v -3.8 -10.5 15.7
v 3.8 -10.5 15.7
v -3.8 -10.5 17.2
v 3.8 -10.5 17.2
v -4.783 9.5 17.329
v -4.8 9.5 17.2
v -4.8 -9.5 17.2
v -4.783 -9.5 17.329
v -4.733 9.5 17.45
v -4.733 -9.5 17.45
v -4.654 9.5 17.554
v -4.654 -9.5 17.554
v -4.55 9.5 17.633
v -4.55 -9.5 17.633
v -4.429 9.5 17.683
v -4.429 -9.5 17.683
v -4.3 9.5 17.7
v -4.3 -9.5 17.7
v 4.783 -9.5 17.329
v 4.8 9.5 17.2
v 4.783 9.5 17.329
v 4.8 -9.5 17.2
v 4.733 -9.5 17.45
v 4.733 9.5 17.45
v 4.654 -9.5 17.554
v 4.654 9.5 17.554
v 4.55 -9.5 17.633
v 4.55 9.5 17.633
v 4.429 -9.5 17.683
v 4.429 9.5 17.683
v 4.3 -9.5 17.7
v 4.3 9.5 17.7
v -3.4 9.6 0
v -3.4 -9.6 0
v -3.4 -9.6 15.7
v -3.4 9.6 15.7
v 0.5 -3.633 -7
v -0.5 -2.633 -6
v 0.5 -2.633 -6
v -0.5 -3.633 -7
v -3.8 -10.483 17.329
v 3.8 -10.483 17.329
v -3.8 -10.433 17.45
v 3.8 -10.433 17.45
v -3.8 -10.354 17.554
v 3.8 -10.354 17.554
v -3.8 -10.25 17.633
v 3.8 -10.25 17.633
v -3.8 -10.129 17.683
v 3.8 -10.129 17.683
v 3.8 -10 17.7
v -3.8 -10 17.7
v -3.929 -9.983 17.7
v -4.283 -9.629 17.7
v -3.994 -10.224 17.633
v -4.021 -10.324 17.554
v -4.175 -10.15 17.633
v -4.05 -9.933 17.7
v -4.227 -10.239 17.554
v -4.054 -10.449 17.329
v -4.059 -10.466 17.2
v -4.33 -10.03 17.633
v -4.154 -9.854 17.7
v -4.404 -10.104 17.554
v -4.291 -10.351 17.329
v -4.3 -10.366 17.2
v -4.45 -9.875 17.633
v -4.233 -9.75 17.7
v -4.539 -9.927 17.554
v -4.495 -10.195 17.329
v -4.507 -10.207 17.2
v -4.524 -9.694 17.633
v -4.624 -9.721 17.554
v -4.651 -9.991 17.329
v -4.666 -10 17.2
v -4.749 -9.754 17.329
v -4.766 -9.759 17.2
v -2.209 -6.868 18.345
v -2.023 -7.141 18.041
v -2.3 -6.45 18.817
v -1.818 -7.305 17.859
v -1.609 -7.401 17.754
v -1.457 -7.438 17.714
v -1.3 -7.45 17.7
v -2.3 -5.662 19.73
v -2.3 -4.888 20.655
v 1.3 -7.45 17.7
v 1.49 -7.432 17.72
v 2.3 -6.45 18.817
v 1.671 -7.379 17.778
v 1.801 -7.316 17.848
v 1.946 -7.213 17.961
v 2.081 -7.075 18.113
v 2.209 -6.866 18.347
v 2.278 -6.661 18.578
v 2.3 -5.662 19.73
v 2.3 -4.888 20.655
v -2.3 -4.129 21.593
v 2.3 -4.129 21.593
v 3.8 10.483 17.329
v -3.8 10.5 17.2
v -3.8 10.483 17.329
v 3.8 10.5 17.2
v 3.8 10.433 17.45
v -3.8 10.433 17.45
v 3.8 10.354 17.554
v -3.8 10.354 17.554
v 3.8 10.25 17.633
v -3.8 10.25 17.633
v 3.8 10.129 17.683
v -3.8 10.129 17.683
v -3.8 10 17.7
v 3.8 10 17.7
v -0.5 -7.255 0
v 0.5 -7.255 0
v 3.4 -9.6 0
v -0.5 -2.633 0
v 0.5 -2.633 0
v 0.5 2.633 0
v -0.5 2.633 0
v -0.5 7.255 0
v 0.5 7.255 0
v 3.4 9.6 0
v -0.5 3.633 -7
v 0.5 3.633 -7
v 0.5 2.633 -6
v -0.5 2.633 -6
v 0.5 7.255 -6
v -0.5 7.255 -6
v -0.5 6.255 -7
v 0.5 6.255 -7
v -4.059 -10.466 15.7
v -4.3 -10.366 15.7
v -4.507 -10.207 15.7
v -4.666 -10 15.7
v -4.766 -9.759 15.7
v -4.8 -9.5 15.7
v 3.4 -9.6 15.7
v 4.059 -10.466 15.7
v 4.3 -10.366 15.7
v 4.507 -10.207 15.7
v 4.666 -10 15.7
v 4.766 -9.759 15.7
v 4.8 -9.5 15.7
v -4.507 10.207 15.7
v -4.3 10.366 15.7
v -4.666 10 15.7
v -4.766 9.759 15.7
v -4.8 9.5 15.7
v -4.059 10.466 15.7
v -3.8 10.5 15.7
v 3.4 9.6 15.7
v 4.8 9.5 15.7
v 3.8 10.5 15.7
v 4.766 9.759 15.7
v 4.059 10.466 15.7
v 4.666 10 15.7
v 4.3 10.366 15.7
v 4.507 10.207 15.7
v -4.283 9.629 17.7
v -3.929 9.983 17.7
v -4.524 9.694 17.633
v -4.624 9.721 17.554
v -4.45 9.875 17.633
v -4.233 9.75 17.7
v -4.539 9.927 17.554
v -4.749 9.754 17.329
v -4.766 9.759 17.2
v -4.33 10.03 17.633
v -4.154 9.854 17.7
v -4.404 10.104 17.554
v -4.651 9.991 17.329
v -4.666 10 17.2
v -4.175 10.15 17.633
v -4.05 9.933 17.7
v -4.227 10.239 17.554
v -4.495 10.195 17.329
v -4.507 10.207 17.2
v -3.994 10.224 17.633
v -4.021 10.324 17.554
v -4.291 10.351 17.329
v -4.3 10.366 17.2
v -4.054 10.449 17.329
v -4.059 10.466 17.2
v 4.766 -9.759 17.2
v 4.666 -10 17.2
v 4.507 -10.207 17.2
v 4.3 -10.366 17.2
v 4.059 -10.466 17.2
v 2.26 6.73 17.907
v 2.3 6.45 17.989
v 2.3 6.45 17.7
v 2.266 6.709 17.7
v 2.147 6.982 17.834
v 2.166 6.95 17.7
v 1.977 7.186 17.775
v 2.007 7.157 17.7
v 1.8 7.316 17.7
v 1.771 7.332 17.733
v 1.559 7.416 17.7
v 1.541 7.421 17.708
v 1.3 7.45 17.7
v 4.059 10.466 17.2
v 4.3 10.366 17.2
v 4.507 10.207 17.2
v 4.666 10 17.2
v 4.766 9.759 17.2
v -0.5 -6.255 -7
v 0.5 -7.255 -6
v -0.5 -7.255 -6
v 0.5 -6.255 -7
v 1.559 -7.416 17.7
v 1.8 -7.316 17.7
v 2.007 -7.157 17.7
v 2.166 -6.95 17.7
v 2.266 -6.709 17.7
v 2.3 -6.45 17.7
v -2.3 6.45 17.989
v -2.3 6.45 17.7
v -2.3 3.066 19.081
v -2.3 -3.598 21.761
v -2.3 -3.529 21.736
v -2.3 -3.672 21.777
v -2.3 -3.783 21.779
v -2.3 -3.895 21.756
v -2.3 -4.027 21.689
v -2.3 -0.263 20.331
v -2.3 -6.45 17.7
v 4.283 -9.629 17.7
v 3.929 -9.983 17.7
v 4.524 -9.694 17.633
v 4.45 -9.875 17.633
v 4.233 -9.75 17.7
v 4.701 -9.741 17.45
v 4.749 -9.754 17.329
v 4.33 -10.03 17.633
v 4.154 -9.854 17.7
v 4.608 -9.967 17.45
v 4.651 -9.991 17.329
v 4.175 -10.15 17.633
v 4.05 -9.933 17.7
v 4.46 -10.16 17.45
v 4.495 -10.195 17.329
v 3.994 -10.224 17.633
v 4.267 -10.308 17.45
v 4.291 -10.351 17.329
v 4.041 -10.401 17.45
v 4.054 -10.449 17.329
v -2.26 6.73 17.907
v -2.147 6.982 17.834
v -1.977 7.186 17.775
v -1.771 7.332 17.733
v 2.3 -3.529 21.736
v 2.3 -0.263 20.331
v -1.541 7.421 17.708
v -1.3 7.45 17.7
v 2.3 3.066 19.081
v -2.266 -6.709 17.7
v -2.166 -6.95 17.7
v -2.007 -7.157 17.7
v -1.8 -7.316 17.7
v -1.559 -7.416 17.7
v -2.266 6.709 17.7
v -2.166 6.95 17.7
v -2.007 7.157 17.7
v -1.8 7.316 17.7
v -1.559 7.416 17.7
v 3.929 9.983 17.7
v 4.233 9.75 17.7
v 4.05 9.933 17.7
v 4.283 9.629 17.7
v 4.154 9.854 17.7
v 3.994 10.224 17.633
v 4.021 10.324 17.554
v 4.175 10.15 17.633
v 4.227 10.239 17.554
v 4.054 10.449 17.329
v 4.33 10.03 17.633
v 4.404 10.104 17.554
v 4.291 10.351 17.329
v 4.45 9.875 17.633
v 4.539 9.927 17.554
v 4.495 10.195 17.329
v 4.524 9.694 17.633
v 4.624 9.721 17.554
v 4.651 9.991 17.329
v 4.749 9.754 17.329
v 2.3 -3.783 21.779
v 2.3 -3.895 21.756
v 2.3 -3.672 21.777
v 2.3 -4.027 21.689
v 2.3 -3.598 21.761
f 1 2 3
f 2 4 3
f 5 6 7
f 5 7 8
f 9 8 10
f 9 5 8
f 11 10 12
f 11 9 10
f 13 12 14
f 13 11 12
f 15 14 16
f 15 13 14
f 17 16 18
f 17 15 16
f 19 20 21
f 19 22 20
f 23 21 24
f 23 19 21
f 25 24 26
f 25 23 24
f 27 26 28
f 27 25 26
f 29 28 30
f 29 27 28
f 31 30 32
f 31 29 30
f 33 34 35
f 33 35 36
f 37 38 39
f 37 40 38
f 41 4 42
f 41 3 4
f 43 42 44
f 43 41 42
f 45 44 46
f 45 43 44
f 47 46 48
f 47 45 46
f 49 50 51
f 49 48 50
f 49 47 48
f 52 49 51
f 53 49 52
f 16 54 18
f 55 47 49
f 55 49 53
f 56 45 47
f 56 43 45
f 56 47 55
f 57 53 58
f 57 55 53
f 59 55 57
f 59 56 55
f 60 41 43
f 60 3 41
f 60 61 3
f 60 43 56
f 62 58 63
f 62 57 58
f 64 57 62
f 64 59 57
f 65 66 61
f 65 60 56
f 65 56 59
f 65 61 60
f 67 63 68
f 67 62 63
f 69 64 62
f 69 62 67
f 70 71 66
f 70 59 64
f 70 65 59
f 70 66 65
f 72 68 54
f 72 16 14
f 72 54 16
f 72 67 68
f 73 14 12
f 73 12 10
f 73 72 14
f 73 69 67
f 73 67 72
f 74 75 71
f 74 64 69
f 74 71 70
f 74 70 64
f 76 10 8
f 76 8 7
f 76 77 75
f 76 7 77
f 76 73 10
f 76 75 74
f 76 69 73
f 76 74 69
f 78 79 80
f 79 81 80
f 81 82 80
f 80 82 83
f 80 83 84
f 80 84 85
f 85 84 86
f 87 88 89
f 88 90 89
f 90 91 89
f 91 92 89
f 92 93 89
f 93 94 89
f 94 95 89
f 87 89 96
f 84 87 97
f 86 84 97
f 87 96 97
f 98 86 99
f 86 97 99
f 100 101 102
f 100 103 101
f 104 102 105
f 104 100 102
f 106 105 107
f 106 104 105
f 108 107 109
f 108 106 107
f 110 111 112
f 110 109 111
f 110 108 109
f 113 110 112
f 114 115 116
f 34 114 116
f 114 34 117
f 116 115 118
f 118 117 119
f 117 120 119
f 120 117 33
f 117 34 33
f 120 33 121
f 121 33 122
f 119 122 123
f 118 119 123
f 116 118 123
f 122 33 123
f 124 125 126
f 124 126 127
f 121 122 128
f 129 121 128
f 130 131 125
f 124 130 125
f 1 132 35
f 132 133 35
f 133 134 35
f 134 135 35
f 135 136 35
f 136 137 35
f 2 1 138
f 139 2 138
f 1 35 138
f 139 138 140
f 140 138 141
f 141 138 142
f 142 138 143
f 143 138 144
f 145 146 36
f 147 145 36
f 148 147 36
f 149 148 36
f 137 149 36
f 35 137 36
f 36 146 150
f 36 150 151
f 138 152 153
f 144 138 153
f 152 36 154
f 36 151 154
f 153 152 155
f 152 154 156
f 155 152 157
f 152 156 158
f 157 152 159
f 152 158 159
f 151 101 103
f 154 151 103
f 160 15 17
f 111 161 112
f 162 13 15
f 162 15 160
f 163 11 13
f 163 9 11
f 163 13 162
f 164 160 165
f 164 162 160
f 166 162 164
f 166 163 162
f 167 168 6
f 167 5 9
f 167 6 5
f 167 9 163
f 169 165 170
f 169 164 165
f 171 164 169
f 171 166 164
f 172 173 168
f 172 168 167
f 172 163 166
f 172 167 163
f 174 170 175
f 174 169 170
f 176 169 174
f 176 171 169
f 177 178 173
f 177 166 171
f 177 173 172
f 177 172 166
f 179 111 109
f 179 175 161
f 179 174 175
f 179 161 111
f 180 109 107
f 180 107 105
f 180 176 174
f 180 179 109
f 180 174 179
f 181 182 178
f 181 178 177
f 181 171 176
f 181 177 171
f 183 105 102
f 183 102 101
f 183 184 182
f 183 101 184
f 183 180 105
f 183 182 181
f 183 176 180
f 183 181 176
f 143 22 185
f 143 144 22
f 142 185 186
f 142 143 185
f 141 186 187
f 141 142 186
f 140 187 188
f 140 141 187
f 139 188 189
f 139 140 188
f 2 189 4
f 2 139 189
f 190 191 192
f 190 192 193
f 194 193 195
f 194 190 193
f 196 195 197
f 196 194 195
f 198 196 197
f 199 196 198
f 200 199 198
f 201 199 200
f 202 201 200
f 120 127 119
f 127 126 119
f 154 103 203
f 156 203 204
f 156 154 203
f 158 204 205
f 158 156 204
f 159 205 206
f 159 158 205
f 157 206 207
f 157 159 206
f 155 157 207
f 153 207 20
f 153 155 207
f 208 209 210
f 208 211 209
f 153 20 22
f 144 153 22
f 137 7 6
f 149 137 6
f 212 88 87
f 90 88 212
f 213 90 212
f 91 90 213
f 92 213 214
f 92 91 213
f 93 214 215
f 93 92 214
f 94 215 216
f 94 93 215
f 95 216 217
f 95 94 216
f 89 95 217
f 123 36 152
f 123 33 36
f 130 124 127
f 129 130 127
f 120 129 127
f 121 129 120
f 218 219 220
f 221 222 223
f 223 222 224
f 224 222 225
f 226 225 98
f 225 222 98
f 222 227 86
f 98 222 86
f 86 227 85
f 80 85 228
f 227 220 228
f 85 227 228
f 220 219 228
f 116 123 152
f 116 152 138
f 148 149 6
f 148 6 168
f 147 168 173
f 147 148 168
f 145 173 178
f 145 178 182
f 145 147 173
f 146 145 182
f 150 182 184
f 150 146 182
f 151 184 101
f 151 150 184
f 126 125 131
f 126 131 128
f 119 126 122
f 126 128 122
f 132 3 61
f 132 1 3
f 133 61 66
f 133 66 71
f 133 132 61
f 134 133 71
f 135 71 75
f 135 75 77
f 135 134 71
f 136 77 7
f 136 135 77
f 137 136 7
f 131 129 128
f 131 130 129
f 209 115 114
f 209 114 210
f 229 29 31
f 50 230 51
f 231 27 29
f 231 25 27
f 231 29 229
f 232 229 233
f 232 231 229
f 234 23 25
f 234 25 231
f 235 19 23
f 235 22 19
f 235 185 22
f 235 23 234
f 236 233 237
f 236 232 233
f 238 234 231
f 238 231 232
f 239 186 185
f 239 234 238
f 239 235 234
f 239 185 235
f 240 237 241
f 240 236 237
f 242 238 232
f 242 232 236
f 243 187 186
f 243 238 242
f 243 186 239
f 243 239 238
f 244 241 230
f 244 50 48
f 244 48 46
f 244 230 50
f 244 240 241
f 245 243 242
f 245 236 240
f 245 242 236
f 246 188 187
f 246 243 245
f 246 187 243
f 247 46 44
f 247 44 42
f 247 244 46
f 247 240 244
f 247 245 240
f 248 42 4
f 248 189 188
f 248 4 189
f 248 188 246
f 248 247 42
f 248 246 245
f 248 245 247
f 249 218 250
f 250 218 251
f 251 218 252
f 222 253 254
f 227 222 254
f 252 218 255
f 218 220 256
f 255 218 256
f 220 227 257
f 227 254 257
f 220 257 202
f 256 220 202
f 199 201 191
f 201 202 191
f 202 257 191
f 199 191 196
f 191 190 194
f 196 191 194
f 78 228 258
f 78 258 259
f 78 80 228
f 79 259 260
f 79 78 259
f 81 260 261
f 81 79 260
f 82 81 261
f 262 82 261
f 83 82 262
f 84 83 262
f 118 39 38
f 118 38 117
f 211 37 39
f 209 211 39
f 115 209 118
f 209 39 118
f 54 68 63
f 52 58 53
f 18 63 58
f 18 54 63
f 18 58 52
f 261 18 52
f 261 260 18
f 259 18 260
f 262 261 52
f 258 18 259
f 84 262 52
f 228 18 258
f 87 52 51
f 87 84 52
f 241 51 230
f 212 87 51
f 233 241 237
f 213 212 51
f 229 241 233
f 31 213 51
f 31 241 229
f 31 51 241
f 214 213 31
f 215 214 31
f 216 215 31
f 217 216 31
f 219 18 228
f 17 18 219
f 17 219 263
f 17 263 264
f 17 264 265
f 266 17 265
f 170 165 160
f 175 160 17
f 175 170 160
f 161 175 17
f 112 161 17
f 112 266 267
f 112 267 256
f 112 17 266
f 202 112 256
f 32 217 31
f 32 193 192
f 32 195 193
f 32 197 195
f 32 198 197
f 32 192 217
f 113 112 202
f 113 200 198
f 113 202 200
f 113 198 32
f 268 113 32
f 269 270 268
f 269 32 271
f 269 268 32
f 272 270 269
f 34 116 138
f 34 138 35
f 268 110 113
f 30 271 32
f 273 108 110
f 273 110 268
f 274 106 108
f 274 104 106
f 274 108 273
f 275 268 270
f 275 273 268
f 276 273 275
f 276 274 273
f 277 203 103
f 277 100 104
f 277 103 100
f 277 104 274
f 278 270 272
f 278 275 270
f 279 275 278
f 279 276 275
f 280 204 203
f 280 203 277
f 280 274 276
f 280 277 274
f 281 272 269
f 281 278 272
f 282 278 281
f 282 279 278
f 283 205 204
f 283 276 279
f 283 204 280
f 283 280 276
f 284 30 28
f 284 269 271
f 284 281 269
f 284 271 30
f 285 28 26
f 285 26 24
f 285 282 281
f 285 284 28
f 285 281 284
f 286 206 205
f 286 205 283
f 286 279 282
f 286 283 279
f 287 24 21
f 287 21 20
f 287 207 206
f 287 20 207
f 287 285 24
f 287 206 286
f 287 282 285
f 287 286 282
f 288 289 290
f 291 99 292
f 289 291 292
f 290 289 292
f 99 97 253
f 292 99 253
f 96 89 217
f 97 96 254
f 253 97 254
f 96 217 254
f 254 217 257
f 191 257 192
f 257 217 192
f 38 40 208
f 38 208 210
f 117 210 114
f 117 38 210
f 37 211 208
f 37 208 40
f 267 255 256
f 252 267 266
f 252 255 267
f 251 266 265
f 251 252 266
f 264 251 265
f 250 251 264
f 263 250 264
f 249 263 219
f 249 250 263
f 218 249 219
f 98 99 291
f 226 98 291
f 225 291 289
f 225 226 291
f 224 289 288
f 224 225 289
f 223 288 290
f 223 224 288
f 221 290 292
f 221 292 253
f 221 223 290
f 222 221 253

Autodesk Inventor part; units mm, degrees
ref_plane "YZ Plane" through (0, 0, 0) normal (1, 0, 0) x (0, 1, 0)
ref_plane "XZ Plane" through (0, 0, 0) normal (0, 1, 0) x (-1, 0, 0)
sketch "Base" plane through (0, 0, 0) normal (0, 0, 1) x (1, 0, 0)
  line L0 (-3.4, 9.6) -> (3.4, 9.6)
  line L1 (3.4, 9.6) -> (3.4, -9.6)
  line L2 (3.4, -9.6) -> (-3.4, -9.6)
  line L3 (-3.4, -9.6) -> (-3.4, 9.6)
  line L4 (-4.76, 0) -> (4.76, 0) construction
  line L5 (0, -13.44) -> (0, 13.44) construction
  point P0 (0, 0)
  point P1 (0, 9.6)
  point P2 (-3.4, 0)
  dimension "d0" = 6.8
  dimension "d1" = 19.2
extrude "BaseFeature" add sketch "Base" along normal blind 17.7
sketch "Mount" plane through (0, 0, 17.7) normal (0, 0, 1) x (1, 0, 0)
  line L0 (-4.8, 10.5) -> (4.8, 10.5)
  line L1 (4.8, 10.5) -> (4.8, -10.5)
  line L2 (4.8, -10.5) -> (-4.8, -10.5)
  line L3 (-4.8, -10.5) -> (-4.8, 10.5)
  line L4 (3.4, -9.6) -> (3.4, 9.6) construction
  line L5 (3.4, 0) -> (4.8, 0) construction
  line L6 (-3.4, -9.6) -> (3.4, -9.6) construction
  line L7 (0, -9.6) -> (0, -10.5) construction
  dimension "d13" = 9.6
  dimension "d14" = 21
extrude "MountFeature" add sketch "Mount" against normal blind 2
sketch "Sketch3" plane through (0, 0, 17.7) normal (0, 0, 1) x (1, 0, 0)
  line L0 (-2.3, -7.45) -> (2.3, -7.45)
  line L1 (-2.3, 7.45) -> (-2.3, -7.45)
  line L2 (2.3, 7.45) -> (-2.3, 7.45)
  line L3 (2.3, -7.45) -> (2.3, 7.45)
  line L4 (-4.8, 10.5) -> (-4.8, -10.5) projected
  line L5 (0, 0) -> (0, 10.5) construction
  line L6 (-4.8, 10.5) -> (4.8, 10.5) projected
  line L7 (-6.72, 0) -> (6.72, 0) construction
  point P0 (0, 7.45)
  point P1 (-2.3, 0)
  dimension "d22" = 14.9
  dimension "d23" = 4.6
extrude "Extrusion3" add sketch "Sketch3" along normal blind 4.2
fillet "Fillet4" radius 1 4 edges at (-2.3, 7.45, 19.8) (2.3, 7.45, 19.8) (-2.3, -7.45, 19.8) (2.3, -7.45, 19.8)
sketch "Sketch4" plane through (2.3, -7.45, 17.7) normal (1, 0, 0) x (0, 0, -1)
  line L0 (0, 0) -> (-4.2, 0) projected
  line L1 (-4.2, 14.9) -> (-4.2, 0) projected
  arc A0 (0, 0) -> (-4.2, 3.5647) centre (-50.9891, -55.8203) ccw
  line L2 (0, 0) -> (0, 14.9) projected
  arc A1 (-4.2, 3.5647) -> (0, 14.9) centre (-72.7661, 35.4157) ccw
  line L3 (0, 14.9) -> (-4.2, 14.9) projected
  point P0 (17.7, 7.45)
extrude "Extrusion4" cut sketch "Sketch4" against normal through all contours L0 L1 A0 | L1 L3 A1
fillet "Fillet1" radius 0.5 1 edges at (0, -3.8853, 21.9)
fillet "Fillet2" radius 1 4 edges at (4.8, -10.5, 16.7) (4.8, 10.5, 16.7) (-4.8, 10.5, 16.7) (-4.8, -10.5, 16.7)
fillet "Fillet3" radius 0.5 4 edges at (0, -10.5, 17.7) (4.8, 0, 17.7) (0, 10.5, 17.7) (-4.8, 0, 17.7)
sketch "Sketch6" plane through (-3.4, -9.6, 0) normal (-1, 0, 0) x (0, 0, 1)
  line L0 (0, 0) -> (0, 19.2) construction
  line L1 (0, 9.6) -> (0, 19.2)
  line L2 (0, 9.6) -> (15.7, 9.6) construction
  line L3 (15.7, 0) -> (15.7, 19.2) projected
  line L4 (0, 16.8553) -> (-7, 16.8553)
  line L5 (-7, 16.8553) -> (-7, 12.233)
  line L6 (-7, 12.233) -> (0, 12.233)
  line L7 (0, 12.233) -> (0, 16.8553)
  line L8 (0, 14.5441) -> (-7, 14.5441) construction
  line L9 (0, 2.3447) -> (-7, 2.3447)
  line L10 (-7, 2.3447) -> (-7, 6.967)
  line L11 (-7, 6.967) -> (0, 6.967)
  line L12 (0, 6.967) -> (0, 2.3447)
  dimension "d16" = 7
ref_plane "Work Plane1" through (0, -9.6, 0) normal (-1, 0, 0) x (0, 0, 1)
sketch "Sketch7" plane through (0, -9.6, 0) normal (-1, 0, 0) x (0, 0, 1)
  line L0 (0, 16.8553) -> (-7, 16.8553) projected
  line L1 (-7, 16.8553) -> (-7, 12.233) projected
  line L2 (-7, 12.233) -> (0, 12.233) projected
  line L3 (0, 19.2) -> (0, 0) projected
  line L4 (-7, 6.967) -> (0, 6.967) projected
  line L5 (-7, 2.3447) -> (-7, 6.967) projected
  line L6 (0, 2.3447) -> (-7, 2.3447) projected
  point P0 (0, 9.6)
extrude "Extrusion5" add sketch "Sketch7" along normal mid plane 1
chamfer "Chamfer1" distance 1 angle 45 4 edges at (0, 7.2553, -7) (0, 2.633, -7) (0, -2.633, -7) (0, -7.2553, -7)
properties part number "RockerSwitch"
